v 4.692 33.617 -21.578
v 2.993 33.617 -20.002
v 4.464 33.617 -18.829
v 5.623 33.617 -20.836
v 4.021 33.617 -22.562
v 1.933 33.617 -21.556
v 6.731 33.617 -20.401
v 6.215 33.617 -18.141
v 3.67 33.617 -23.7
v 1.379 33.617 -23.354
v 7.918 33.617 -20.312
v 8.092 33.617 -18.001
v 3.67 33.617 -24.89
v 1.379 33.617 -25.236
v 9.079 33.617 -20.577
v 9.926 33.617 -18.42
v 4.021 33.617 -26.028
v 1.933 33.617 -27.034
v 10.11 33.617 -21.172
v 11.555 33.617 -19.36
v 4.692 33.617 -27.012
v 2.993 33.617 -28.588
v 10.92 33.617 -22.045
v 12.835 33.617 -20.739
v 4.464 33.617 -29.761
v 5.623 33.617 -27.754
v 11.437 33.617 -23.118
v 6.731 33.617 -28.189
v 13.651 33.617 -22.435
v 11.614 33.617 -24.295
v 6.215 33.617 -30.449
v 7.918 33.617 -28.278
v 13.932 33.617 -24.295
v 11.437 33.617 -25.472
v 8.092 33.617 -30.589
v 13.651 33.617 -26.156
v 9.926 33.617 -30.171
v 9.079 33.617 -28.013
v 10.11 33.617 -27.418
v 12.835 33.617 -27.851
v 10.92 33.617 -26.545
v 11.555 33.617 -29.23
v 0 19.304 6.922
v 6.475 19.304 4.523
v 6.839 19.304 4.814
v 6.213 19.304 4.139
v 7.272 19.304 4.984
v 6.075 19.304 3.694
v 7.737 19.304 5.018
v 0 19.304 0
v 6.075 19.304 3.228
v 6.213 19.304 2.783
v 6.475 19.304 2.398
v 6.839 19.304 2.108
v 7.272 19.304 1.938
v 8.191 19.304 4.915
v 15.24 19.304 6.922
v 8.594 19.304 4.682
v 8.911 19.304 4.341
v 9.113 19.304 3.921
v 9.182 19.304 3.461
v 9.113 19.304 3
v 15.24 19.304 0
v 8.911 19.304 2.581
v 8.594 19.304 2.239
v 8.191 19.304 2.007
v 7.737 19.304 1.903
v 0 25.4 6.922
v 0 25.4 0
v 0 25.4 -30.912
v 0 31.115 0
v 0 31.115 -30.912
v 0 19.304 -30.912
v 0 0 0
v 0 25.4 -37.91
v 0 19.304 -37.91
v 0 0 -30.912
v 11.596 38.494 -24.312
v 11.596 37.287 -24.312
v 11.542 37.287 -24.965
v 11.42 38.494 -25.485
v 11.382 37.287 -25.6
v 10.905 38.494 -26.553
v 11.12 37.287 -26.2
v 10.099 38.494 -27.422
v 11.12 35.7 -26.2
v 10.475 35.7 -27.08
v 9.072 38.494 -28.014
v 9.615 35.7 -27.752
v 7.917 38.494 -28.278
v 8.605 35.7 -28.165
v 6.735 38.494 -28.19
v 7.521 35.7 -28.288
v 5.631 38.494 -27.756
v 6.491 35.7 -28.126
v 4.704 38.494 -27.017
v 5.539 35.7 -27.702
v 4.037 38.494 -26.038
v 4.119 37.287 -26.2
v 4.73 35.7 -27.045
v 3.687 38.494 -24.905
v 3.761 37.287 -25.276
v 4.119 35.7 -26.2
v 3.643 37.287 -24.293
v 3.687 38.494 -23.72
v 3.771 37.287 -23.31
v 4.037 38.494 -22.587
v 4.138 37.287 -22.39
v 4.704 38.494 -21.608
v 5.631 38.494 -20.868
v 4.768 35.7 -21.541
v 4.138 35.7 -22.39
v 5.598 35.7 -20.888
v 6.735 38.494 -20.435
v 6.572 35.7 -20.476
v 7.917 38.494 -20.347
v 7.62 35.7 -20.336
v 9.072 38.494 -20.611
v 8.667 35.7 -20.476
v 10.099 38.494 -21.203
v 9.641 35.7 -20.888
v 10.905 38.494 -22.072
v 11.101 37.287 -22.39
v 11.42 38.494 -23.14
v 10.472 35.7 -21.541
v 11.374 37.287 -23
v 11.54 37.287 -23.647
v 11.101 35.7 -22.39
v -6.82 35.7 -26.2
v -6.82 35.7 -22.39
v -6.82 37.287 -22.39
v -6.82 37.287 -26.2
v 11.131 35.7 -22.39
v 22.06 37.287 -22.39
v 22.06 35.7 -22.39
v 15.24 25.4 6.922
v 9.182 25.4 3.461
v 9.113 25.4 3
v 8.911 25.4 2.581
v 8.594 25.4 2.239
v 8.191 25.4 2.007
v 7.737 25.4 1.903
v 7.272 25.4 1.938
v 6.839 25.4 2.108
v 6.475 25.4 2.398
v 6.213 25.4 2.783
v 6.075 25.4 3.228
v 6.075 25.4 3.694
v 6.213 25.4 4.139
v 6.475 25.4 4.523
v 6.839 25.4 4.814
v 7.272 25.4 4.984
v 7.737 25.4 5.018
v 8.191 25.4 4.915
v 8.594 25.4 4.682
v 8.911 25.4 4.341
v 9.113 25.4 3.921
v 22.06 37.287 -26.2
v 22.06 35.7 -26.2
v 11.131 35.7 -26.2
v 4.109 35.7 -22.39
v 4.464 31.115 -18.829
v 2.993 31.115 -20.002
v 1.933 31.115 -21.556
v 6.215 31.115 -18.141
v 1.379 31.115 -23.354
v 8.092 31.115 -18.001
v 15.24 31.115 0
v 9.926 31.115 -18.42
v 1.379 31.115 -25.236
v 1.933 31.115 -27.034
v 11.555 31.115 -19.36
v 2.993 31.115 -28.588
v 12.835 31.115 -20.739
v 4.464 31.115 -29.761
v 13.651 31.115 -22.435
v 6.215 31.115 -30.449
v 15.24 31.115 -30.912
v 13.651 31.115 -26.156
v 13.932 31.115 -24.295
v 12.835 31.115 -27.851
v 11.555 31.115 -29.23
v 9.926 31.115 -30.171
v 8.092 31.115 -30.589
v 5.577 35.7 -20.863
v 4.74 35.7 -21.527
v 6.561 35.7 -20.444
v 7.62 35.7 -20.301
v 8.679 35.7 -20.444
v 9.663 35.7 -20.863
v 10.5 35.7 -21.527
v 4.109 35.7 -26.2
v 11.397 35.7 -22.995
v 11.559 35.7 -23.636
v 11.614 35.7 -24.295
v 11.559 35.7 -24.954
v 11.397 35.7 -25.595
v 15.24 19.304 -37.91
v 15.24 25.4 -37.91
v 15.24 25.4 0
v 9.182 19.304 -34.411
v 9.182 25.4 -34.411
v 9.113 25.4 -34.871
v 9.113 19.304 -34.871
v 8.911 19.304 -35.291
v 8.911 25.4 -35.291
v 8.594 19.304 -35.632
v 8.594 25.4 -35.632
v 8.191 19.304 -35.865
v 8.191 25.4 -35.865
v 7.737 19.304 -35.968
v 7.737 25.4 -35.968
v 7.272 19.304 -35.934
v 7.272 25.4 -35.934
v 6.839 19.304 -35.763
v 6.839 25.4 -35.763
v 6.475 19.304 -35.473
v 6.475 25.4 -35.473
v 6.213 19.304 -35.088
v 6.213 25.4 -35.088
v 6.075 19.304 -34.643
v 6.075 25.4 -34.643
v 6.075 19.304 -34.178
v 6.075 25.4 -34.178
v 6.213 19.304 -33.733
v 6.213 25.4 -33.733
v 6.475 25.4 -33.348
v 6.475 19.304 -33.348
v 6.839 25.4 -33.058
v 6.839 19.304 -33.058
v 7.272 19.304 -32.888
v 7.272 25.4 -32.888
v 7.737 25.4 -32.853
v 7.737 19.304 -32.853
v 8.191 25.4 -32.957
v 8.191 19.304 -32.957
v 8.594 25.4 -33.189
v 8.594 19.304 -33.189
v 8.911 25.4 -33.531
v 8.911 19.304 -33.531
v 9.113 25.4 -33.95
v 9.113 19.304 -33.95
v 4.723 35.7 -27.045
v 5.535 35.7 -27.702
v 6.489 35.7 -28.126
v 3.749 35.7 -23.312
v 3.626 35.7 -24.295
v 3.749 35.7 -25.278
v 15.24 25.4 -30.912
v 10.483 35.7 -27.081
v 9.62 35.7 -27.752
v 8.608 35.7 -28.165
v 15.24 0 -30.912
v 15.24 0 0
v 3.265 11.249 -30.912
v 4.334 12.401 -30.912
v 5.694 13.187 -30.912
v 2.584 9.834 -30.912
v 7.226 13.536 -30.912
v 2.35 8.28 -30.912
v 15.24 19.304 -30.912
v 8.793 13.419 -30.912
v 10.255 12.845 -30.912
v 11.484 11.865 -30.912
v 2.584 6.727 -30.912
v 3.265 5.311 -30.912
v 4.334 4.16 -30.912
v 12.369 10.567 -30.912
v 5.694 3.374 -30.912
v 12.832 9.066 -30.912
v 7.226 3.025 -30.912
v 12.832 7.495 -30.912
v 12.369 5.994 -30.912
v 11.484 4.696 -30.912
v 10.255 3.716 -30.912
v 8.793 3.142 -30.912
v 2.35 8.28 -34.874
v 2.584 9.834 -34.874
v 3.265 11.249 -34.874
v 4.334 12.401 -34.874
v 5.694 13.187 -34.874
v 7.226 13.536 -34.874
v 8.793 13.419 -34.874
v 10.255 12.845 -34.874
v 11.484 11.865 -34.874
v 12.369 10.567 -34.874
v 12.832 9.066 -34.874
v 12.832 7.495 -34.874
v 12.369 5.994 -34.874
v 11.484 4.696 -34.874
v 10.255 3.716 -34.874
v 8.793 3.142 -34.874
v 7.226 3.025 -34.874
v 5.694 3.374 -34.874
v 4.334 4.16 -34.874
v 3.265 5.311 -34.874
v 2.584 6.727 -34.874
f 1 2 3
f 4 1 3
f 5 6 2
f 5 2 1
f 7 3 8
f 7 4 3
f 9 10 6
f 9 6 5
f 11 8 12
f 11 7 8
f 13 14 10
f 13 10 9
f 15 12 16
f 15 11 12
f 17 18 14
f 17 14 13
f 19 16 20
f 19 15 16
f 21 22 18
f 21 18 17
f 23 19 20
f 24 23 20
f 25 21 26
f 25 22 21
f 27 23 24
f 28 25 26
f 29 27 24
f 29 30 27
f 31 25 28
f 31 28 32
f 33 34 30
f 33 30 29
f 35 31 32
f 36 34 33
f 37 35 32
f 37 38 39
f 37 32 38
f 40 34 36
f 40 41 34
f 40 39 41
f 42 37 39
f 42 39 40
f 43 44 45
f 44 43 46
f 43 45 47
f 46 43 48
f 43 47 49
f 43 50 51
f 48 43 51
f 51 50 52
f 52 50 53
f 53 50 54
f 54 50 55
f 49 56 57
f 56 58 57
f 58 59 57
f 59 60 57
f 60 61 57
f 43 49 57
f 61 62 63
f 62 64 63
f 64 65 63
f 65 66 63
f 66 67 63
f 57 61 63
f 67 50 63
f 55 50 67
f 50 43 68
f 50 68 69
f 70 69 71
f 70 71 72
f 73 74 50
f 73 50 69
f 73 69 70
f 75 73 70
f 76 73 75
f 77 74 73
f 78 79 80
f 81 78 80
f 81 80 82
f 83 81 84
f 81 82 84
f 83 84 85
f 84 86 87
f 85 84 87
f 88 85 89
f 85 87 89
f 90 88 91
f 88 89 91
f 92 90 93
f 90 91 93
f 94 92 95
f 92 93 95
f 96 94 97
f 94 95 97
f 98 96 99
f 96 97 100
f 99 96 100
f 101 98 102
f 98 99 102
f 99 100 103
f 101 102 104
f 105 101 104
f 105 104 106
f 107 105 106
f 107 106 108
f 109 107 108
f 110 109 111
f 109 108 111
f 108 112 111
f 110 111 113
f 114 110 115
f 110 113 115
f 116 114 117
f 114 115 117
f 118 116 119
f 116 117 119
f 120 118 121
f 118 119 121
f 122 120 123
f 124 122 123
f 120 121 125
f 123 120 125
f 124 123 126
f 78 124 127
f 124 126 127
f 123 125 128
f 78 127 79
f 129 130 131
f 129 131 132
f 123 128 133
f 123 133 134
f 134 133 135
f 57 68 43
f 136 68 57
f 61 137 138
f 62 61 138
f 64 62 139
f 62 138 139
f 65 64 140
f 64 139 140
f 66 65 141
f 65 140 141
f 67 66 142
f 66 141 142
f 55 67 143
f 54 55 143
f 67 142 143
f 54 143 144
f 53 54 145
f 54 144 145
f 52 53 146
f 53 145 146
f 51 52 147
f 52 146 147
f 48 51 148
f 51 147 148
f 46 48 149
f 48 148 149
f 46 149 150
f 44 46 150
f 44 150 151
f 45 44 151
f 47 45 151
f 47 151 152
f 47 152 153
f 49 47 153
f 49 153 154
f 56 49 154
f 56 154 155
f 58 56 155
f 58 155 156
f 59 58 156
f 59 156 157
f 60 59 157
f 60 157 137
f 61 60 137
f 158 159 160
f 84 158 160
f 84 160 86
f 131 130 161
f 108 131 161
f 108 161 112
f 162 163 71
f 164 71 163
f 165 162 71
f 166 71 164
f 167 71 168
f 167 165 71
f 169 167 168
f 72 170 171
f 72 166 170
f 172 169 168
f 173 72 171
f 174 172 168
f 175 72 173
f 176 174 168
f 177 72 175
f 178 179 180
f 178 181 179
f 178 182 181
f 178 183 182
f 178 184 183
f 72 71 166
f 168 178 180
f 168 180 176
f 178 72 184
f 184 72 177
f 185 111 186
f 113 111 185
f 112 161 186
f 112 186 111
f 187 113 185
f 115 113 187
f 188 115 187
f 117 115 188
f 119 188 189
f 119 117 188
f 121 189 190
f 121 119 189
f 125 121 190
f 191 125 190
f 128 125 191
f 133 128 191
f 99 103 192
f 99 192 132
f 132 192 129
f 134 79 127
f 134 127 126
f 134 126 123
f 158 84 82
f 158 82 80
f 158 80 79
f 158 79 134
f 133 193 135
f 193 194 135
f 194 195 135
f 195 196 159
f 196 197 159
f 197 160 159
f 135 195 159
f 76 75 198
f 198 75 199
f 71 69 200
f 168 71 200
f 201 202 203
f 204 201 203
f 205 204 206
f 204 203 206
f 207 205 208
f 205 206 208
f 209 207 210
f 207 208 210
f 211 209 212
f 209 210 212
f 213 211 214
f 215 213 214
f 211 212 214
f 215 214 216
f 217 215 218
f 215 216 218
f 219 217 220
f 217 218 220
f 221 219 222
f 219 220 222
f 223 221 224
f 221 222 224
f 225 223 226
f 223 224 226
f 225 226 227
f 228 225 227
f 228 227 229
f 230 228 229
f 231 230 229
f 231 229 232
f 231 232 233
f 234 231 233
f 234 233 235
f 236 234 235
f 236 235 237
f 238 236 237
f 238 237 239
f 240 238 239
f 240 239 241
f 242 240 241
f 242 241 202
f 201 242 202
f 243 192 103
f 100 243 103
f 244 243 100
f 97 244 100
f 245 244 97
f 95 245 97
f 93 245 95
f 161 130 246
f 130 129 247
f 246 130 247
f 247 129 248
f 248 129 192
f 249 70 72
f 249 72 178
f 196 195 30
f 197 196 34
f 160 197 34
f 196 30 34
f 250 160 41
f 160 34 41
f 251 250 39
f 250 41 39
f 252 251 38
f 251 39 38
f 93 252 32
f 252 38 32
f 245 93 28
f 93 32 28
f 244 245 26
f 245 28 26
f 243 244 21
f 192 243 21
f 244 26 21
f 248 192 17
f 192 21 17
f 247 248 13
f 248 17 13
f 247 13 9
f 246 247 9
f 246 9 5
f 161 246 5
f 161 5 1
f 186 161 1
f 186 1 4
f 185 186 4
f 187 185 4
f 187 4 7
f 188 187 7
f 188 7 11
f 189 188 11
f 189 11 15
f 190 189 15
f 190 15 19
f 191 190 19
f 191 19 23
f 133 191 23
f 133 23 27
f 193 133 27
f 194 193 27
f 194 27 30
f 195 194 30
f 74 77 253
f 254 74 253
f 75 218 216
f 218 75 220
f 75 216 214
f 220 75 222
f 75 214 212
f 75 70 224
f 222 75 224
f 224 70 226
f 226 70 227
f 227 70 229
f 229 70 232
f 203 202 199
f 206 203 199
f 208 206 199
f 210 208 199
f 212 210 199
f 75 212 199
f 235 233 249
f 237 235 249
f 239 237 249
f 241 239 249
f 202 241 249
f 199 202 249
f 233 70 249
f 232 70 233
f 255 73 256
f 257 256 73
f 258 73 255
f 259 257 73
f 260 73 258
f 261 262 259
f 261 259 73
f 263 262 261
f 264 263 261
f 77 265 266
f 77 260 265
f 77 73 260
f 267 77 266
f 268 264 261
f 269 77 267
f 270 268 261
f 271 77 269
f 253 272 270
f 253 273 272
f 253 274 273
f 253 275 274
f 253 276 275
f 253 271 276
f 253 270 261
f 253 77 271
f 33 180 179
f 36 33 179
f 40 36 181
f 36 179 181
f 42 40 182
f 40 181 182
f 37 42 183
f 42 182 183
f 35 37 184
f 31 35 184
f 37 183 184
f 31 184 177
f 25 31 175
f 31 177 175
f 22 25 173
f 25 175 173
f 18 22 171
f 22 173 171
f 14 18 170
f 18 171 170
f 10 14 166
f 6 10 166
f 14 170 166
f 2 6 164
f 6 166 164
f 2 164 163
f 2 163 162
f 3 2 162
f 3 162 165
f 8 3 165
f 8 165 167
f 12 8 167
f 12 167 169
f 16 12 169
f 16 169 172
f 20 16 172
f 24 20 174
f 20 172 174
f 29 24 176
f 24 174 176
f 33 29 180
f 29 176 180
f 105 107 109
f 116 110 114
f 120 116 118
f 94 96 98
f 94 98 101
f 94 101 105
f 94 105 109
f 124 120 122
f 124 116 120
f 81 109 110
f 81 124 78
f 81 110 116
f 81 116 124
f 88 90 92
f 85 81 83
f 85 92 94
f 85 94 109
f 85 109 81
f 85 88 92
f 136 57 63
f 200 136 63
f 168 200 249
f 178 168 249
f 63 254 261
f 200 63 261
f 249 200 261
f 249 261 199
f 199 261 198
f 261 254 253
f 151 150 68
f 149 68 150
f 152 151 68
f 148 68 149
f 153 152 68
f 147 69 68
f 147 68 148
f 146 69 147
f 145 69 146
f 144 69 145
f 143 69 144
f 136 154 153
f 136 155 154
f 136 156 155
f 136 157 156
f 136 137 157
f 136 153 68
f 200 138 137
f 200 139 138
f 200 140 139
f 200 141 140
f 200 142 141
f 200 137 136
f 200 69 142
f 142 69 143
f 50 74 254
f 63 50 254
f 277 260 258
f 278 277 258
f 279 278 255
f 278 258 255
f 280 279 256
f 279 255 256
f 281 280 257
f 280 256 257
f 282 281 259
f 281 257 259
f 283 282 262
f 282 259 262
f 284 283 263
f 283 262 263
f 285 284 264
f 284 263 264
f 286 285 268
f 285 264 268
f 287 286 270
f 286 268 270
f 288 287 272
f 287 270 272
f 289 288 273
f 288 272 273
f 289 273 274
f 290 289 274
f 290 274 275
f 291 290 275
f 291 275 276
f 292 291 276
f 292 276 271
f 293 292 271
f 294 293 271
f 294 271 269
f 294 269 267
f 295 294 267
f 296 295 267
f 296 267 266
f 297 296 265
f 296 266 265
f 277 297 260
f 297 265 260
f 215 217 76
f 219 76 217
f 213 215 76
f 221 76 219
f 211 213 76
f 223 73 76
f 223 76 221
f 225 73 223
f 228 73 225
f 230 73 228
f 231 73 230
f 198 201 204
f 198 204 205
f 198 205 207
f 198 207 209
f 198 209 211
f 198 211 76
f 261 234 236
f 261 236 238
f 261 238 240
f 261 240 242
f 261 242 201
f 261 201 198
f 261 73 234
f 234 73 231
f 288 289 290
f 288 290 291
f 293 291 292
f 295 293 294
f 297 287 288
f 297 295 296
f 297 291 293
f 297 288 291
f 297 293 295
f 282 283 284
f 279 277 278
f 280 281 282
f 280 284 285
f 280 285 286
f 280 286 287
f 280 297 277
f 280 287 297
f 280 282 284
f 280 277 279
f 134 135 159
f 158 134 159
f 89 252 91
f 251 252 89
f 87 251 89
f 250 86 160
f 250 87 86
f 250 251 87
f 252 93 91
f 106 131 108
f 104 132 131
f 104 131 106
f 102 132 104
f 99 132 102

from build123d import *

# Parameters (mm, degrees)
SKETCH1_W                = 15.24
SKETCH1_H                = 30.9118
BOSS_EXTRUDE1_DEPTH      = 31.115
SKETCH2_W                = 15.24
SKETCH2_H                = 6.096
BOSS_EXTRUDE2_DEPTH      = 6.9215
BOSS_EXTRUDE2_DEPTH_BACK = 37.9095
SKETCH3_R                = 5.2705
BOSS_EXTRUDE3_DEPTH      = 3.9624
SKETCH4_R                = 6.3119
BOSS_EXTRUDE4_DEPTH      = 2.5019
CUT_EXTRUDE1_REACH       = 27.4
SKETCH8_R                = 1.5621
CUT_EXTRUDE2_REACH       = 27.4
SKETCH9_R                = 1.5621
SKETCH10_R               = 3.99415
BOSS_EXTRUDE5_DEPTH      = 2.0828
SKETCH11_W               = 14.4399
SKETCH11_H               = 3.81
BOSS_EXTRUDE6_DEPTH      = 1.5875
SKETCH12_R               = 3.976792142
BOSS_EXTRUDE7_DEPTH      = 2.794


with BuildPart() as part:
    # Sketch1 → Boss-Extrude1 (new body)
    with BuildSketch(Plane(origin=(0, 0, 0), x_dir=(1, 0, 0), z_dir=(0, 1, 0))):
        with Locations((7.62, 15.4559)):
            Rectangle(SKETCH1_W, SKETCH1_H)
    extrude(amount=BOSS_EXTRUDE1_DEPTH)

    # Sketch2 → Boss-Extrude2 (add, two sides)
    with BuildSketch(Plane.XY) as boss_extrude2_sk:
        with Locations((7.62, 22.352)):
            Rectangle(SKETCH2_W, SKETCH2_H)
    extrude(amount=BOSS_EXTRUDE2_DEPTH)
    extrude(boss_extrude2_sk.sketch, amount=-BOSS_EXTRUDE2_DEPTH_BACK)

    # Sketch3 → Boss-Extrude3 (add)
    with BuildSketch(Plane(origin=(0, 0, -30.9118), x_dir=(-1, 0, 0), z_dir=(0, 0, -1))):
        with Locations((-7.62, 8.2804)):
            Circle(SKETCH3_R)
    extrude(amount=BOSS_EXTRUDE3_DEPTH)

    # Sketch4 → Boss-Extrude4 (add)
    with BuildSketch(Plane(origin=(0, 31.115, 0), x_dir=(1, 0, 0), z_dir=(0, 1, 0))):
        with Locations((7.62, 24.2951)):
            Circle(SKETCH4_R)
    extrude(amount=BOSS_EXTRUDE4_DEPTH)

    # Sketch8 → Cut-Extrude1 (cut, up to next)
    with BuildSketch(Plane(origin=(0, 25.4, 0), x_dir=(1, 0, 0), z_dir=(0, 1, 0)), mode=Mode.PRIVATE) as cut_extrude1_sk1:
        with Locations((7.62, -3.46075)):
            Circle(SKETCH8_R)
    cut_extrude1_tool1 = extrude(cut_extrude1_sk1.sketch, amount=-CUT_EXTRUDE1_REACH, mode=Mode.PRIVATE) & part.part
    add(cut_extrude1_tool1.solids().sort_by_distance((7.62, 25.4, 3.46075))[0], mode=Mode.SUBTRACT)

    # Sketch9 → Cut-Extrude2 (cut, up to next)
    with BuildSketch(Plane(origin=(0, 25.4, 0), x_dir=(1, 0, 0), z_dir=(0, 1, 0)), mode=Mode.PRIVATE) as cut_extrude2_sk1:
        with Locations((7.62, 34.41065)):
            Circle(SKETCH9_R)
    cut_extrude2_tool1 = extrude(cut_extrude2_sk1.sketch, amount=-CUT_EXTRUDE2_REACH, mode=Mode.PRIVATE) & part.part
    add(cut_extrude2_tool1.solids().sort_by_distance((7.62, 25.4, -34.41065))[0], mode=Mode.SUBTRACT)

    # Sketch10 → Boss-Extrude5 (add)
    with BuildSketch(Plane(origin=(0, 33.6169, 0), x_dir=(1, 0, 0), z_dir=(0, 1, 0))):
        with Locations((7.62, 24.2951)):
            Circle(SKETCH10_R)
    extrude(amount=BOSS_EXTRUDE5_DEPTH)

    # Sketch11 → Boss-Extrude6 (add)
    with BuildSketch(Plane(origin=(0, 35.6997, 0), x_dir=(1, 0, 0), z_dir=(0, 1, 0))):
        with Locations((14.83995, 24.2951)):
            Rectangle(SKETCH11_W, SKETCH11_H)
        with Locations((0.40005, 24.2951)):
            Rectangle(SKETCH11_W, SKETCH11_H)
    extrude(amount=BOSS_EXTRUDE6_DEPTH)

    # Sketch12 → Boss-Extrude7 (add)
    with BuildSketch(Plane(origin=(0, 35.6997, 0), x_dir=(1, 0, 0), z_dir=(0, 1, 0))):
        with Locations((7.619570472, 24.312452542)):
            Circle(SKETCH12_R)
    extrude(amount=BOSS_EXTRUDE7_DEPTH)


solid = part.part
